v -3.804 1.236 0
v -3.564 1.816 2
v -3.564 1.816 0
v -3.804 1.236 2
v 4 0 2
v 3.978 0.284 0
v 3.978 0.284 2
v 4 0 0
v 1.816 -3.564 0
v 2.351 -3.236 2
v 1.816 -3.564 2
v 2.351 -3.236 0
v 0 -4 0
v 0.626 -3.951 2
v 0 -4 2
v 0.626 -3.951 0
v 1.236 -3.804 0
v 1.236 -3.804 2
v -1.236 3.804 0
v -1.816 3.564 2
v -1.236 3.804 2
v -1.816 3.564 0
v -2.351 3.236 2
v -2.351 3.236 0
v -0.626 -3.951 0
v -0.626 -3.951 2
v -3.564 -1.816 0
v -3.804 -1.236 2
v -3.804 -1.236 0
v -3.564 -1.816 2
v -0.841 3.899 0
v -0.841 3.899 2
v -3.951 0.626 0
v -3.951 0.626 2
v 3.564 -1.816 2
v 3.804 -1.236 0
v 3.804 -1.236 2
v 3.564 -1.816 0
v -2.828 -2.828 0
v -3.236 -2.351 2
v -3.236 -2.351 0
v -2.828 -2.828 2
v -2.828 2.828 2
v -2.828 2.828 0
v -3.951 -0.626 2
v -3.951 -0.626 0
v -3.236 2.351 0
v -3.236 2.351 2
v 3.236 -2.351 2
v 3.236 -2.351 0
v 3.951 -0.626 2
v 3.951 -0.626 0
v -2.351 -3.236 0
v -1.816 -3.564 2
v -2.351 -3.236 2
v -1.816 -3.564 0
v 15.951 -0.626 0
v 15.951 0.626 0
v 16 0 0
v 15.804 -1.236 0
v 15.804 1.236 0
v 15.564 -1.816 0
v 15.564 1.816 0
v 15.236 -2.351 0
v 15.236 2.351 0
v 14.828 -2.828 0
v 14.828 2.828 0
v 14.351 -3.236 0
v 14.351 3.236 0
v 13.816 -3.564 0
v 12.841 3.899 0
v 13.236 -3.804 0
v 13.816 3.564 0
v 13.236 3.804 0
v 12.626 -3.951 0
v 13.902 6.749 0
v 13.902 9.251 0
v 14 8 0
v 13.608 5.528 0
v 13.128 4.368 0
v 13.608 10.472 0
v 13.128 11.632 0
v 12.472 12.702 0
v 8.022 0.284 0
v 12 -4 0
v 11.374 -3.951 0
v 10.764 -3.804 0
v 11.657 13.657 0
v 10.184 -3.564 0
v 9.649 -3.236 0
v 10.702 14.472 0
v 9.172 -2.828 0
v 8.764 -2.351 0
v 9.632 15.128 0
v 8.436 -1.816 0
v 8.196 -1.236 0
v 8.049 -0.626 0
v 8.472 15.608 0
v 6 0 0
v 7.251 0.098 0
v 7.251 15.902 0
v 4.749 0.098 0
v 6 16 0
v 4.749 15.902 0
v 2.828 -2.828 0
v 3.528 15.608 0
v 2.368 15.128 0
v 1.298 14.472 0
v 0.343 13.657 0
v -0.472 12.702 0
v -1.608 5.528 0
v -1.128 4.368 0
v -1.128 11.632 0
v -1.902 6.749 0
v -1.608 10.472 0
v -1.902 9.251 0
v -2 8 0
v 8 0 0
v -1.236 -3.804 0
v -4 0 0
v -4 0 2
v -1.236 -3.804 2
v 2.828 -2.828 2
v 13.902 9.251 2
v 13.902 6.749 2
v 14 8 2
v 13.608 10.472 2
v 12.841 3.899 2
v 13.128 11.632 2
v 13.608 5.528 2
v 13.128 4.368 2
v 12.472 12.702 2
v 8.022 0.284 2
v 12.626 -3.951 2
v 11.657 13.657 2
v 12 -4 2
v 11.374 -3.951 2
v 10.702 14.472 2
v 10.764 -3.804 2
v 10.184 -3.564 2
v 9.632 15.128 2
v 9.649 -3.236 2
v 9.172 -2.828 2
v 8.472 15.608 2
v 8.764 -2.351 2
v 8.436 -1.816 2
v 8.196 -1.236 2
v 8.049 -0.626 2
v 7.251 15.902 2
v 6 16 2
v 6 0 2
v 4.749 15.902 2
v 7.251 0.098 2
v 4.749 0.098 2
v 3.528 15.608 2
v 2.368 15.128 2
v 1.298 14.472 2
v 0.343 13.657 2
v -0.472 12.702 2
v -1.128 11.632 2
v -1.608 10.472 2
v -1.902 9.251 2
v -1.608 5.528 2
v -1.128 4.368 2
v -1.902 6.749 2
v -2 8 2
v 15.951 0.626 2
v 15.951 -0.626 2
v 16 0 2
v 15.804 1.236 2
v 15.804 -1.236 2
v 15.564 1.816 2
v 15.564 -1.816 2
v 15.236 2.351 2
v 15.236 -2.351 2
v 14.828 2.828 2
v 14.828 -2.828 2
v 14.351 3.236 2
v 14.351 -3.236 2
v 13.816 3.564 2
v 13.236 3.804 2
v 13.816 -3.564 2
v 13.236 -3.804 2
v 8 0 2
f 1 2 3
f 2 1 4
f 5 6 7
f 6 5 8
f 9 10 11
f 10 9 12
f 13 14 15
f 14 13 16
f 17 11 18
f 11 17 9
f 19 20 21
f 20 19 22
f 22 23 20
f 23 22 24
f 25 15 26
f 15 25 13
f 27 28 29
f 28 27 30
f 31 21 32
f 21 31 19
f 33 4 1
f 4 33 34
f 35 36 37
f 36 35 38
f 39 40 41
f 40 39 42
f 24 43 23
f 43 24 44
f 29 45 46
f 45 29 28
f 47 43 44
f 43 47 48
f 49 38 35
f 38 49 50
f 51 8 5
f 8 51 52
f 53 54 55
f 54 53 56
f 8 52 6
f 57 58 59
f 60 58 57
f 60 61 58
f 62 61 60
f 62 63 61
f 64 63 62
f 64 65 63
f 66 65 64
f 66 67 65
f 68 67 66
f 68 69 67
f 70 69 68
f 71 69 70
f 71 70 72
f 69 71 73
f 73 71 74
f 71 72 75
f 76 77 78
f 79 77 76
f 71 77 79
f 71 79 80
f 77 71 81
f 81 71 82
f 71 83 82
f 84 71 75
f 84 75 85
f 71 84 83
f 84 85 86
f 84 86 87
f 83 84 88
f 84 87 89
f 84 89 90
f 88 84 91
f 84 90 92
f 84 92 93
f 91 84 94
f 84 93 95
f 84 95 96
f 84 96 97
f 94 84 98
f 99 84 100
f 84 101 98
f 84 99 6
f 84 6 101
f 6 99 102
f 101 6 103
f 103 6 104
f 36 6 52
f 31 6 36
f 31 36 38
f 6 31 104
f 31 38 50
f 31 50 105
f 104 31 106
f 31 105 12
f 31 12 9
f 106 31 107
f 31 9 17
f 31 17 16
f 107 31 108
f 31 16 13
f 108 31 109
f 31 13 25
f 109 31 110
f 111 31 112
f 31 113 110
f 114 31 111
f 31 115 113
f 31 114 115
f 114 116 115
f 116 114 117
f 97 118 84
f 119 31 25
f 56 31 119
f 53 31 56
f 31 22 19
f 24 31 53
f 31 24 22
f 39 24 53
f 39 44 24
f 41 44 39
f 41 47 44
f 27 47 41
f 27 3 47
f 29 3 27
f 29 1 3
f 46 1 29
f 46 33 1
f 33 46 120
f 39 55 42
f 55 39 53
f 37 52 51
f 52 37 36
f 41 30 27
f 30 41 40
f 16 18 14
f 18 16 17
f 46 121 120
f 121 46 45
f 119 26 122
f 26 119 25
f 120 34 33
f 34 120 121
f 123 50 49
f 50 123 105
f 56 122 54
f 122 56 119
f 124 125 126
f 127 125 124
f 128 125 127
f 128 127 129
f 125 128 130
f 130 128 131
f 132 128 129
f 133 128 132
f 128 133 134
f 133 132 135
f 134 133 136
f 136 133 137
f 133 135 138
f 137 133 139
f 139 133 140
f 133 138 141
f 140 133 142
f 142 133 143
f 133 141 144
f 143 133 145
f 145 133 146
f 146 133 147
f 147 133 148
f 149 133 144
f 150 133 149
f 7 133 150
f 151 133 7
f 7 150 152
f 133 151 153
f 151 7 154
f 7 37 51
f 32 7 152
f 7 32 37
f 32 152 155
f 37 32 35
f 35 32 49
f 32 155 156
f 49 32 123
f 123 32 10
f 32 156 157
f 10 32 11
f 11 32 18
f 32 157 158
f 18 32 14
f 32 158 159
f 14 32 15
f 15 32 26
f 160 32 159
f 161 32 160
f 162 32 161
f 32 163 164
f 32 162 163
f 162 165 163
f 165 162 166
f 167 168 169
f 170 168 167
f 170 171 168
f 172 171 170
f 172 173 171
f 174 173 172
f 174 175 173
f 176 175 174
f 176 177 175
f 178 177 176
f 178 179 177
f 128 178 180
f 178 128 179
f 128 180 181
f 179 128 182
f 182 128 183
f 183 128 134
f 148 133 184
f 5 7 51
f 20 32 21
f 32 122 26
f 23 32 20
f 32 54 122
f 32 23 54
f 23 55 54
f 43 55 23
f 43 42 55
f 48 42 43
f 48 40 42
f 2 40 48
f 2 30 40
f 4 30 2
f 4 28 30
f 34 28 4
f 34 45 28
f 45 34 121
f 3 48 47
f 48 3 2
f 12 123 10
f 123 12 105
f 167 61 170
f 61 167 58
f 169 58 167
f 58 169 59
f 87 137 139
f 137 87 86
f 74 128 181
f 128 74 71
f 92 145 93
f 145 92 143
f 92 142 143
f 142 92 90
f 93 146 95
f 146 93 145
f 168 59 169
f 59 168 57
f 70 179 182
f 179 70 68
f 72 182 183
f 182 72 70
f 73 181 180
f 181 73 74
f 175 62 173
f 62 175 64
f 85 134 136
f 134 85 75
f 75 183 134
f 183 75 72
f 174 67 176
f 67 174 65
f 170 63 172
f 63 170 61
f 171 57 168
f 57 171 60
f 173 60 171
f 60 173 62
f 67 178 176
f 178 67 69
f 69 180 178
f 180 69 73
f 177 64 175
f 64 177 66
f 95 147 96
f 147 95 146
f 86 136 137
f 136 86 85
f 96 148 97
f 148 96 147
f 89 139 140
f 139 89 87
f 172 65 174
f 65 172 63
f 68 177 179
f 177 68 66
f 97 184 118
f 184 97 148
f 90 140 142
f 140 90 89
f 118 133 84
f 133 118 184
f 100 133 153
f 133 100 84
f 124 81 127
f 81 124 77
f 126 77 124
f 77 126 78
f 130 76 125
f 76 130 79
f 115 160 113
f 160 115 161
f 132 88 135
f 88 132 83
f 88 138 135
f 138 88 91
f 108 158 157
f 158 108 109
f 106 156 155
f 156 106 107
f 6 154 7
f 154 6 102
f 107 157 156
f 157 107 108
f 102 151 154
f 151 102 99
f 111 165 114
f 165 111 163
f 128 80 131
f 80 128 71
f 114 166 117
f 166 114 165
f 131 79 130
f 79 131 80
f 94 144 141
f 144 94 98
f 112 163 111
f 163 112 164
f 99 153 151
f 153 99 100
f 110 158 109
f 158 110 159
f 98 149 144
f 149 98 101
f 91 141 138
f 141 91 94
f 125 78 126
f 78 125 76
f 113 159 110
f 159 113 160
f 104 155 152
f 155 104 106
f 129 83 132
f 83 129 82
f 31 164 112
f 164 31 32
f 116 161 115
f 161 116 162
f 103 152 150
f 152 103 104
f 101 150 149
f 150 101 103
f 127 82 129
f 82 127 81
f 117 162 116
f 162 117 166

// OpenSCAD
//3D Shapes- Design Time: Mouse

$fn = 40;

cylinder(h=2, r1=4, r2=4);
translate([12, 0, 0]) cylinder(h=2, r1=4, r2=4);
translate([6, 8, 0]) cylinder(h=2, r1=8, r2=8);
